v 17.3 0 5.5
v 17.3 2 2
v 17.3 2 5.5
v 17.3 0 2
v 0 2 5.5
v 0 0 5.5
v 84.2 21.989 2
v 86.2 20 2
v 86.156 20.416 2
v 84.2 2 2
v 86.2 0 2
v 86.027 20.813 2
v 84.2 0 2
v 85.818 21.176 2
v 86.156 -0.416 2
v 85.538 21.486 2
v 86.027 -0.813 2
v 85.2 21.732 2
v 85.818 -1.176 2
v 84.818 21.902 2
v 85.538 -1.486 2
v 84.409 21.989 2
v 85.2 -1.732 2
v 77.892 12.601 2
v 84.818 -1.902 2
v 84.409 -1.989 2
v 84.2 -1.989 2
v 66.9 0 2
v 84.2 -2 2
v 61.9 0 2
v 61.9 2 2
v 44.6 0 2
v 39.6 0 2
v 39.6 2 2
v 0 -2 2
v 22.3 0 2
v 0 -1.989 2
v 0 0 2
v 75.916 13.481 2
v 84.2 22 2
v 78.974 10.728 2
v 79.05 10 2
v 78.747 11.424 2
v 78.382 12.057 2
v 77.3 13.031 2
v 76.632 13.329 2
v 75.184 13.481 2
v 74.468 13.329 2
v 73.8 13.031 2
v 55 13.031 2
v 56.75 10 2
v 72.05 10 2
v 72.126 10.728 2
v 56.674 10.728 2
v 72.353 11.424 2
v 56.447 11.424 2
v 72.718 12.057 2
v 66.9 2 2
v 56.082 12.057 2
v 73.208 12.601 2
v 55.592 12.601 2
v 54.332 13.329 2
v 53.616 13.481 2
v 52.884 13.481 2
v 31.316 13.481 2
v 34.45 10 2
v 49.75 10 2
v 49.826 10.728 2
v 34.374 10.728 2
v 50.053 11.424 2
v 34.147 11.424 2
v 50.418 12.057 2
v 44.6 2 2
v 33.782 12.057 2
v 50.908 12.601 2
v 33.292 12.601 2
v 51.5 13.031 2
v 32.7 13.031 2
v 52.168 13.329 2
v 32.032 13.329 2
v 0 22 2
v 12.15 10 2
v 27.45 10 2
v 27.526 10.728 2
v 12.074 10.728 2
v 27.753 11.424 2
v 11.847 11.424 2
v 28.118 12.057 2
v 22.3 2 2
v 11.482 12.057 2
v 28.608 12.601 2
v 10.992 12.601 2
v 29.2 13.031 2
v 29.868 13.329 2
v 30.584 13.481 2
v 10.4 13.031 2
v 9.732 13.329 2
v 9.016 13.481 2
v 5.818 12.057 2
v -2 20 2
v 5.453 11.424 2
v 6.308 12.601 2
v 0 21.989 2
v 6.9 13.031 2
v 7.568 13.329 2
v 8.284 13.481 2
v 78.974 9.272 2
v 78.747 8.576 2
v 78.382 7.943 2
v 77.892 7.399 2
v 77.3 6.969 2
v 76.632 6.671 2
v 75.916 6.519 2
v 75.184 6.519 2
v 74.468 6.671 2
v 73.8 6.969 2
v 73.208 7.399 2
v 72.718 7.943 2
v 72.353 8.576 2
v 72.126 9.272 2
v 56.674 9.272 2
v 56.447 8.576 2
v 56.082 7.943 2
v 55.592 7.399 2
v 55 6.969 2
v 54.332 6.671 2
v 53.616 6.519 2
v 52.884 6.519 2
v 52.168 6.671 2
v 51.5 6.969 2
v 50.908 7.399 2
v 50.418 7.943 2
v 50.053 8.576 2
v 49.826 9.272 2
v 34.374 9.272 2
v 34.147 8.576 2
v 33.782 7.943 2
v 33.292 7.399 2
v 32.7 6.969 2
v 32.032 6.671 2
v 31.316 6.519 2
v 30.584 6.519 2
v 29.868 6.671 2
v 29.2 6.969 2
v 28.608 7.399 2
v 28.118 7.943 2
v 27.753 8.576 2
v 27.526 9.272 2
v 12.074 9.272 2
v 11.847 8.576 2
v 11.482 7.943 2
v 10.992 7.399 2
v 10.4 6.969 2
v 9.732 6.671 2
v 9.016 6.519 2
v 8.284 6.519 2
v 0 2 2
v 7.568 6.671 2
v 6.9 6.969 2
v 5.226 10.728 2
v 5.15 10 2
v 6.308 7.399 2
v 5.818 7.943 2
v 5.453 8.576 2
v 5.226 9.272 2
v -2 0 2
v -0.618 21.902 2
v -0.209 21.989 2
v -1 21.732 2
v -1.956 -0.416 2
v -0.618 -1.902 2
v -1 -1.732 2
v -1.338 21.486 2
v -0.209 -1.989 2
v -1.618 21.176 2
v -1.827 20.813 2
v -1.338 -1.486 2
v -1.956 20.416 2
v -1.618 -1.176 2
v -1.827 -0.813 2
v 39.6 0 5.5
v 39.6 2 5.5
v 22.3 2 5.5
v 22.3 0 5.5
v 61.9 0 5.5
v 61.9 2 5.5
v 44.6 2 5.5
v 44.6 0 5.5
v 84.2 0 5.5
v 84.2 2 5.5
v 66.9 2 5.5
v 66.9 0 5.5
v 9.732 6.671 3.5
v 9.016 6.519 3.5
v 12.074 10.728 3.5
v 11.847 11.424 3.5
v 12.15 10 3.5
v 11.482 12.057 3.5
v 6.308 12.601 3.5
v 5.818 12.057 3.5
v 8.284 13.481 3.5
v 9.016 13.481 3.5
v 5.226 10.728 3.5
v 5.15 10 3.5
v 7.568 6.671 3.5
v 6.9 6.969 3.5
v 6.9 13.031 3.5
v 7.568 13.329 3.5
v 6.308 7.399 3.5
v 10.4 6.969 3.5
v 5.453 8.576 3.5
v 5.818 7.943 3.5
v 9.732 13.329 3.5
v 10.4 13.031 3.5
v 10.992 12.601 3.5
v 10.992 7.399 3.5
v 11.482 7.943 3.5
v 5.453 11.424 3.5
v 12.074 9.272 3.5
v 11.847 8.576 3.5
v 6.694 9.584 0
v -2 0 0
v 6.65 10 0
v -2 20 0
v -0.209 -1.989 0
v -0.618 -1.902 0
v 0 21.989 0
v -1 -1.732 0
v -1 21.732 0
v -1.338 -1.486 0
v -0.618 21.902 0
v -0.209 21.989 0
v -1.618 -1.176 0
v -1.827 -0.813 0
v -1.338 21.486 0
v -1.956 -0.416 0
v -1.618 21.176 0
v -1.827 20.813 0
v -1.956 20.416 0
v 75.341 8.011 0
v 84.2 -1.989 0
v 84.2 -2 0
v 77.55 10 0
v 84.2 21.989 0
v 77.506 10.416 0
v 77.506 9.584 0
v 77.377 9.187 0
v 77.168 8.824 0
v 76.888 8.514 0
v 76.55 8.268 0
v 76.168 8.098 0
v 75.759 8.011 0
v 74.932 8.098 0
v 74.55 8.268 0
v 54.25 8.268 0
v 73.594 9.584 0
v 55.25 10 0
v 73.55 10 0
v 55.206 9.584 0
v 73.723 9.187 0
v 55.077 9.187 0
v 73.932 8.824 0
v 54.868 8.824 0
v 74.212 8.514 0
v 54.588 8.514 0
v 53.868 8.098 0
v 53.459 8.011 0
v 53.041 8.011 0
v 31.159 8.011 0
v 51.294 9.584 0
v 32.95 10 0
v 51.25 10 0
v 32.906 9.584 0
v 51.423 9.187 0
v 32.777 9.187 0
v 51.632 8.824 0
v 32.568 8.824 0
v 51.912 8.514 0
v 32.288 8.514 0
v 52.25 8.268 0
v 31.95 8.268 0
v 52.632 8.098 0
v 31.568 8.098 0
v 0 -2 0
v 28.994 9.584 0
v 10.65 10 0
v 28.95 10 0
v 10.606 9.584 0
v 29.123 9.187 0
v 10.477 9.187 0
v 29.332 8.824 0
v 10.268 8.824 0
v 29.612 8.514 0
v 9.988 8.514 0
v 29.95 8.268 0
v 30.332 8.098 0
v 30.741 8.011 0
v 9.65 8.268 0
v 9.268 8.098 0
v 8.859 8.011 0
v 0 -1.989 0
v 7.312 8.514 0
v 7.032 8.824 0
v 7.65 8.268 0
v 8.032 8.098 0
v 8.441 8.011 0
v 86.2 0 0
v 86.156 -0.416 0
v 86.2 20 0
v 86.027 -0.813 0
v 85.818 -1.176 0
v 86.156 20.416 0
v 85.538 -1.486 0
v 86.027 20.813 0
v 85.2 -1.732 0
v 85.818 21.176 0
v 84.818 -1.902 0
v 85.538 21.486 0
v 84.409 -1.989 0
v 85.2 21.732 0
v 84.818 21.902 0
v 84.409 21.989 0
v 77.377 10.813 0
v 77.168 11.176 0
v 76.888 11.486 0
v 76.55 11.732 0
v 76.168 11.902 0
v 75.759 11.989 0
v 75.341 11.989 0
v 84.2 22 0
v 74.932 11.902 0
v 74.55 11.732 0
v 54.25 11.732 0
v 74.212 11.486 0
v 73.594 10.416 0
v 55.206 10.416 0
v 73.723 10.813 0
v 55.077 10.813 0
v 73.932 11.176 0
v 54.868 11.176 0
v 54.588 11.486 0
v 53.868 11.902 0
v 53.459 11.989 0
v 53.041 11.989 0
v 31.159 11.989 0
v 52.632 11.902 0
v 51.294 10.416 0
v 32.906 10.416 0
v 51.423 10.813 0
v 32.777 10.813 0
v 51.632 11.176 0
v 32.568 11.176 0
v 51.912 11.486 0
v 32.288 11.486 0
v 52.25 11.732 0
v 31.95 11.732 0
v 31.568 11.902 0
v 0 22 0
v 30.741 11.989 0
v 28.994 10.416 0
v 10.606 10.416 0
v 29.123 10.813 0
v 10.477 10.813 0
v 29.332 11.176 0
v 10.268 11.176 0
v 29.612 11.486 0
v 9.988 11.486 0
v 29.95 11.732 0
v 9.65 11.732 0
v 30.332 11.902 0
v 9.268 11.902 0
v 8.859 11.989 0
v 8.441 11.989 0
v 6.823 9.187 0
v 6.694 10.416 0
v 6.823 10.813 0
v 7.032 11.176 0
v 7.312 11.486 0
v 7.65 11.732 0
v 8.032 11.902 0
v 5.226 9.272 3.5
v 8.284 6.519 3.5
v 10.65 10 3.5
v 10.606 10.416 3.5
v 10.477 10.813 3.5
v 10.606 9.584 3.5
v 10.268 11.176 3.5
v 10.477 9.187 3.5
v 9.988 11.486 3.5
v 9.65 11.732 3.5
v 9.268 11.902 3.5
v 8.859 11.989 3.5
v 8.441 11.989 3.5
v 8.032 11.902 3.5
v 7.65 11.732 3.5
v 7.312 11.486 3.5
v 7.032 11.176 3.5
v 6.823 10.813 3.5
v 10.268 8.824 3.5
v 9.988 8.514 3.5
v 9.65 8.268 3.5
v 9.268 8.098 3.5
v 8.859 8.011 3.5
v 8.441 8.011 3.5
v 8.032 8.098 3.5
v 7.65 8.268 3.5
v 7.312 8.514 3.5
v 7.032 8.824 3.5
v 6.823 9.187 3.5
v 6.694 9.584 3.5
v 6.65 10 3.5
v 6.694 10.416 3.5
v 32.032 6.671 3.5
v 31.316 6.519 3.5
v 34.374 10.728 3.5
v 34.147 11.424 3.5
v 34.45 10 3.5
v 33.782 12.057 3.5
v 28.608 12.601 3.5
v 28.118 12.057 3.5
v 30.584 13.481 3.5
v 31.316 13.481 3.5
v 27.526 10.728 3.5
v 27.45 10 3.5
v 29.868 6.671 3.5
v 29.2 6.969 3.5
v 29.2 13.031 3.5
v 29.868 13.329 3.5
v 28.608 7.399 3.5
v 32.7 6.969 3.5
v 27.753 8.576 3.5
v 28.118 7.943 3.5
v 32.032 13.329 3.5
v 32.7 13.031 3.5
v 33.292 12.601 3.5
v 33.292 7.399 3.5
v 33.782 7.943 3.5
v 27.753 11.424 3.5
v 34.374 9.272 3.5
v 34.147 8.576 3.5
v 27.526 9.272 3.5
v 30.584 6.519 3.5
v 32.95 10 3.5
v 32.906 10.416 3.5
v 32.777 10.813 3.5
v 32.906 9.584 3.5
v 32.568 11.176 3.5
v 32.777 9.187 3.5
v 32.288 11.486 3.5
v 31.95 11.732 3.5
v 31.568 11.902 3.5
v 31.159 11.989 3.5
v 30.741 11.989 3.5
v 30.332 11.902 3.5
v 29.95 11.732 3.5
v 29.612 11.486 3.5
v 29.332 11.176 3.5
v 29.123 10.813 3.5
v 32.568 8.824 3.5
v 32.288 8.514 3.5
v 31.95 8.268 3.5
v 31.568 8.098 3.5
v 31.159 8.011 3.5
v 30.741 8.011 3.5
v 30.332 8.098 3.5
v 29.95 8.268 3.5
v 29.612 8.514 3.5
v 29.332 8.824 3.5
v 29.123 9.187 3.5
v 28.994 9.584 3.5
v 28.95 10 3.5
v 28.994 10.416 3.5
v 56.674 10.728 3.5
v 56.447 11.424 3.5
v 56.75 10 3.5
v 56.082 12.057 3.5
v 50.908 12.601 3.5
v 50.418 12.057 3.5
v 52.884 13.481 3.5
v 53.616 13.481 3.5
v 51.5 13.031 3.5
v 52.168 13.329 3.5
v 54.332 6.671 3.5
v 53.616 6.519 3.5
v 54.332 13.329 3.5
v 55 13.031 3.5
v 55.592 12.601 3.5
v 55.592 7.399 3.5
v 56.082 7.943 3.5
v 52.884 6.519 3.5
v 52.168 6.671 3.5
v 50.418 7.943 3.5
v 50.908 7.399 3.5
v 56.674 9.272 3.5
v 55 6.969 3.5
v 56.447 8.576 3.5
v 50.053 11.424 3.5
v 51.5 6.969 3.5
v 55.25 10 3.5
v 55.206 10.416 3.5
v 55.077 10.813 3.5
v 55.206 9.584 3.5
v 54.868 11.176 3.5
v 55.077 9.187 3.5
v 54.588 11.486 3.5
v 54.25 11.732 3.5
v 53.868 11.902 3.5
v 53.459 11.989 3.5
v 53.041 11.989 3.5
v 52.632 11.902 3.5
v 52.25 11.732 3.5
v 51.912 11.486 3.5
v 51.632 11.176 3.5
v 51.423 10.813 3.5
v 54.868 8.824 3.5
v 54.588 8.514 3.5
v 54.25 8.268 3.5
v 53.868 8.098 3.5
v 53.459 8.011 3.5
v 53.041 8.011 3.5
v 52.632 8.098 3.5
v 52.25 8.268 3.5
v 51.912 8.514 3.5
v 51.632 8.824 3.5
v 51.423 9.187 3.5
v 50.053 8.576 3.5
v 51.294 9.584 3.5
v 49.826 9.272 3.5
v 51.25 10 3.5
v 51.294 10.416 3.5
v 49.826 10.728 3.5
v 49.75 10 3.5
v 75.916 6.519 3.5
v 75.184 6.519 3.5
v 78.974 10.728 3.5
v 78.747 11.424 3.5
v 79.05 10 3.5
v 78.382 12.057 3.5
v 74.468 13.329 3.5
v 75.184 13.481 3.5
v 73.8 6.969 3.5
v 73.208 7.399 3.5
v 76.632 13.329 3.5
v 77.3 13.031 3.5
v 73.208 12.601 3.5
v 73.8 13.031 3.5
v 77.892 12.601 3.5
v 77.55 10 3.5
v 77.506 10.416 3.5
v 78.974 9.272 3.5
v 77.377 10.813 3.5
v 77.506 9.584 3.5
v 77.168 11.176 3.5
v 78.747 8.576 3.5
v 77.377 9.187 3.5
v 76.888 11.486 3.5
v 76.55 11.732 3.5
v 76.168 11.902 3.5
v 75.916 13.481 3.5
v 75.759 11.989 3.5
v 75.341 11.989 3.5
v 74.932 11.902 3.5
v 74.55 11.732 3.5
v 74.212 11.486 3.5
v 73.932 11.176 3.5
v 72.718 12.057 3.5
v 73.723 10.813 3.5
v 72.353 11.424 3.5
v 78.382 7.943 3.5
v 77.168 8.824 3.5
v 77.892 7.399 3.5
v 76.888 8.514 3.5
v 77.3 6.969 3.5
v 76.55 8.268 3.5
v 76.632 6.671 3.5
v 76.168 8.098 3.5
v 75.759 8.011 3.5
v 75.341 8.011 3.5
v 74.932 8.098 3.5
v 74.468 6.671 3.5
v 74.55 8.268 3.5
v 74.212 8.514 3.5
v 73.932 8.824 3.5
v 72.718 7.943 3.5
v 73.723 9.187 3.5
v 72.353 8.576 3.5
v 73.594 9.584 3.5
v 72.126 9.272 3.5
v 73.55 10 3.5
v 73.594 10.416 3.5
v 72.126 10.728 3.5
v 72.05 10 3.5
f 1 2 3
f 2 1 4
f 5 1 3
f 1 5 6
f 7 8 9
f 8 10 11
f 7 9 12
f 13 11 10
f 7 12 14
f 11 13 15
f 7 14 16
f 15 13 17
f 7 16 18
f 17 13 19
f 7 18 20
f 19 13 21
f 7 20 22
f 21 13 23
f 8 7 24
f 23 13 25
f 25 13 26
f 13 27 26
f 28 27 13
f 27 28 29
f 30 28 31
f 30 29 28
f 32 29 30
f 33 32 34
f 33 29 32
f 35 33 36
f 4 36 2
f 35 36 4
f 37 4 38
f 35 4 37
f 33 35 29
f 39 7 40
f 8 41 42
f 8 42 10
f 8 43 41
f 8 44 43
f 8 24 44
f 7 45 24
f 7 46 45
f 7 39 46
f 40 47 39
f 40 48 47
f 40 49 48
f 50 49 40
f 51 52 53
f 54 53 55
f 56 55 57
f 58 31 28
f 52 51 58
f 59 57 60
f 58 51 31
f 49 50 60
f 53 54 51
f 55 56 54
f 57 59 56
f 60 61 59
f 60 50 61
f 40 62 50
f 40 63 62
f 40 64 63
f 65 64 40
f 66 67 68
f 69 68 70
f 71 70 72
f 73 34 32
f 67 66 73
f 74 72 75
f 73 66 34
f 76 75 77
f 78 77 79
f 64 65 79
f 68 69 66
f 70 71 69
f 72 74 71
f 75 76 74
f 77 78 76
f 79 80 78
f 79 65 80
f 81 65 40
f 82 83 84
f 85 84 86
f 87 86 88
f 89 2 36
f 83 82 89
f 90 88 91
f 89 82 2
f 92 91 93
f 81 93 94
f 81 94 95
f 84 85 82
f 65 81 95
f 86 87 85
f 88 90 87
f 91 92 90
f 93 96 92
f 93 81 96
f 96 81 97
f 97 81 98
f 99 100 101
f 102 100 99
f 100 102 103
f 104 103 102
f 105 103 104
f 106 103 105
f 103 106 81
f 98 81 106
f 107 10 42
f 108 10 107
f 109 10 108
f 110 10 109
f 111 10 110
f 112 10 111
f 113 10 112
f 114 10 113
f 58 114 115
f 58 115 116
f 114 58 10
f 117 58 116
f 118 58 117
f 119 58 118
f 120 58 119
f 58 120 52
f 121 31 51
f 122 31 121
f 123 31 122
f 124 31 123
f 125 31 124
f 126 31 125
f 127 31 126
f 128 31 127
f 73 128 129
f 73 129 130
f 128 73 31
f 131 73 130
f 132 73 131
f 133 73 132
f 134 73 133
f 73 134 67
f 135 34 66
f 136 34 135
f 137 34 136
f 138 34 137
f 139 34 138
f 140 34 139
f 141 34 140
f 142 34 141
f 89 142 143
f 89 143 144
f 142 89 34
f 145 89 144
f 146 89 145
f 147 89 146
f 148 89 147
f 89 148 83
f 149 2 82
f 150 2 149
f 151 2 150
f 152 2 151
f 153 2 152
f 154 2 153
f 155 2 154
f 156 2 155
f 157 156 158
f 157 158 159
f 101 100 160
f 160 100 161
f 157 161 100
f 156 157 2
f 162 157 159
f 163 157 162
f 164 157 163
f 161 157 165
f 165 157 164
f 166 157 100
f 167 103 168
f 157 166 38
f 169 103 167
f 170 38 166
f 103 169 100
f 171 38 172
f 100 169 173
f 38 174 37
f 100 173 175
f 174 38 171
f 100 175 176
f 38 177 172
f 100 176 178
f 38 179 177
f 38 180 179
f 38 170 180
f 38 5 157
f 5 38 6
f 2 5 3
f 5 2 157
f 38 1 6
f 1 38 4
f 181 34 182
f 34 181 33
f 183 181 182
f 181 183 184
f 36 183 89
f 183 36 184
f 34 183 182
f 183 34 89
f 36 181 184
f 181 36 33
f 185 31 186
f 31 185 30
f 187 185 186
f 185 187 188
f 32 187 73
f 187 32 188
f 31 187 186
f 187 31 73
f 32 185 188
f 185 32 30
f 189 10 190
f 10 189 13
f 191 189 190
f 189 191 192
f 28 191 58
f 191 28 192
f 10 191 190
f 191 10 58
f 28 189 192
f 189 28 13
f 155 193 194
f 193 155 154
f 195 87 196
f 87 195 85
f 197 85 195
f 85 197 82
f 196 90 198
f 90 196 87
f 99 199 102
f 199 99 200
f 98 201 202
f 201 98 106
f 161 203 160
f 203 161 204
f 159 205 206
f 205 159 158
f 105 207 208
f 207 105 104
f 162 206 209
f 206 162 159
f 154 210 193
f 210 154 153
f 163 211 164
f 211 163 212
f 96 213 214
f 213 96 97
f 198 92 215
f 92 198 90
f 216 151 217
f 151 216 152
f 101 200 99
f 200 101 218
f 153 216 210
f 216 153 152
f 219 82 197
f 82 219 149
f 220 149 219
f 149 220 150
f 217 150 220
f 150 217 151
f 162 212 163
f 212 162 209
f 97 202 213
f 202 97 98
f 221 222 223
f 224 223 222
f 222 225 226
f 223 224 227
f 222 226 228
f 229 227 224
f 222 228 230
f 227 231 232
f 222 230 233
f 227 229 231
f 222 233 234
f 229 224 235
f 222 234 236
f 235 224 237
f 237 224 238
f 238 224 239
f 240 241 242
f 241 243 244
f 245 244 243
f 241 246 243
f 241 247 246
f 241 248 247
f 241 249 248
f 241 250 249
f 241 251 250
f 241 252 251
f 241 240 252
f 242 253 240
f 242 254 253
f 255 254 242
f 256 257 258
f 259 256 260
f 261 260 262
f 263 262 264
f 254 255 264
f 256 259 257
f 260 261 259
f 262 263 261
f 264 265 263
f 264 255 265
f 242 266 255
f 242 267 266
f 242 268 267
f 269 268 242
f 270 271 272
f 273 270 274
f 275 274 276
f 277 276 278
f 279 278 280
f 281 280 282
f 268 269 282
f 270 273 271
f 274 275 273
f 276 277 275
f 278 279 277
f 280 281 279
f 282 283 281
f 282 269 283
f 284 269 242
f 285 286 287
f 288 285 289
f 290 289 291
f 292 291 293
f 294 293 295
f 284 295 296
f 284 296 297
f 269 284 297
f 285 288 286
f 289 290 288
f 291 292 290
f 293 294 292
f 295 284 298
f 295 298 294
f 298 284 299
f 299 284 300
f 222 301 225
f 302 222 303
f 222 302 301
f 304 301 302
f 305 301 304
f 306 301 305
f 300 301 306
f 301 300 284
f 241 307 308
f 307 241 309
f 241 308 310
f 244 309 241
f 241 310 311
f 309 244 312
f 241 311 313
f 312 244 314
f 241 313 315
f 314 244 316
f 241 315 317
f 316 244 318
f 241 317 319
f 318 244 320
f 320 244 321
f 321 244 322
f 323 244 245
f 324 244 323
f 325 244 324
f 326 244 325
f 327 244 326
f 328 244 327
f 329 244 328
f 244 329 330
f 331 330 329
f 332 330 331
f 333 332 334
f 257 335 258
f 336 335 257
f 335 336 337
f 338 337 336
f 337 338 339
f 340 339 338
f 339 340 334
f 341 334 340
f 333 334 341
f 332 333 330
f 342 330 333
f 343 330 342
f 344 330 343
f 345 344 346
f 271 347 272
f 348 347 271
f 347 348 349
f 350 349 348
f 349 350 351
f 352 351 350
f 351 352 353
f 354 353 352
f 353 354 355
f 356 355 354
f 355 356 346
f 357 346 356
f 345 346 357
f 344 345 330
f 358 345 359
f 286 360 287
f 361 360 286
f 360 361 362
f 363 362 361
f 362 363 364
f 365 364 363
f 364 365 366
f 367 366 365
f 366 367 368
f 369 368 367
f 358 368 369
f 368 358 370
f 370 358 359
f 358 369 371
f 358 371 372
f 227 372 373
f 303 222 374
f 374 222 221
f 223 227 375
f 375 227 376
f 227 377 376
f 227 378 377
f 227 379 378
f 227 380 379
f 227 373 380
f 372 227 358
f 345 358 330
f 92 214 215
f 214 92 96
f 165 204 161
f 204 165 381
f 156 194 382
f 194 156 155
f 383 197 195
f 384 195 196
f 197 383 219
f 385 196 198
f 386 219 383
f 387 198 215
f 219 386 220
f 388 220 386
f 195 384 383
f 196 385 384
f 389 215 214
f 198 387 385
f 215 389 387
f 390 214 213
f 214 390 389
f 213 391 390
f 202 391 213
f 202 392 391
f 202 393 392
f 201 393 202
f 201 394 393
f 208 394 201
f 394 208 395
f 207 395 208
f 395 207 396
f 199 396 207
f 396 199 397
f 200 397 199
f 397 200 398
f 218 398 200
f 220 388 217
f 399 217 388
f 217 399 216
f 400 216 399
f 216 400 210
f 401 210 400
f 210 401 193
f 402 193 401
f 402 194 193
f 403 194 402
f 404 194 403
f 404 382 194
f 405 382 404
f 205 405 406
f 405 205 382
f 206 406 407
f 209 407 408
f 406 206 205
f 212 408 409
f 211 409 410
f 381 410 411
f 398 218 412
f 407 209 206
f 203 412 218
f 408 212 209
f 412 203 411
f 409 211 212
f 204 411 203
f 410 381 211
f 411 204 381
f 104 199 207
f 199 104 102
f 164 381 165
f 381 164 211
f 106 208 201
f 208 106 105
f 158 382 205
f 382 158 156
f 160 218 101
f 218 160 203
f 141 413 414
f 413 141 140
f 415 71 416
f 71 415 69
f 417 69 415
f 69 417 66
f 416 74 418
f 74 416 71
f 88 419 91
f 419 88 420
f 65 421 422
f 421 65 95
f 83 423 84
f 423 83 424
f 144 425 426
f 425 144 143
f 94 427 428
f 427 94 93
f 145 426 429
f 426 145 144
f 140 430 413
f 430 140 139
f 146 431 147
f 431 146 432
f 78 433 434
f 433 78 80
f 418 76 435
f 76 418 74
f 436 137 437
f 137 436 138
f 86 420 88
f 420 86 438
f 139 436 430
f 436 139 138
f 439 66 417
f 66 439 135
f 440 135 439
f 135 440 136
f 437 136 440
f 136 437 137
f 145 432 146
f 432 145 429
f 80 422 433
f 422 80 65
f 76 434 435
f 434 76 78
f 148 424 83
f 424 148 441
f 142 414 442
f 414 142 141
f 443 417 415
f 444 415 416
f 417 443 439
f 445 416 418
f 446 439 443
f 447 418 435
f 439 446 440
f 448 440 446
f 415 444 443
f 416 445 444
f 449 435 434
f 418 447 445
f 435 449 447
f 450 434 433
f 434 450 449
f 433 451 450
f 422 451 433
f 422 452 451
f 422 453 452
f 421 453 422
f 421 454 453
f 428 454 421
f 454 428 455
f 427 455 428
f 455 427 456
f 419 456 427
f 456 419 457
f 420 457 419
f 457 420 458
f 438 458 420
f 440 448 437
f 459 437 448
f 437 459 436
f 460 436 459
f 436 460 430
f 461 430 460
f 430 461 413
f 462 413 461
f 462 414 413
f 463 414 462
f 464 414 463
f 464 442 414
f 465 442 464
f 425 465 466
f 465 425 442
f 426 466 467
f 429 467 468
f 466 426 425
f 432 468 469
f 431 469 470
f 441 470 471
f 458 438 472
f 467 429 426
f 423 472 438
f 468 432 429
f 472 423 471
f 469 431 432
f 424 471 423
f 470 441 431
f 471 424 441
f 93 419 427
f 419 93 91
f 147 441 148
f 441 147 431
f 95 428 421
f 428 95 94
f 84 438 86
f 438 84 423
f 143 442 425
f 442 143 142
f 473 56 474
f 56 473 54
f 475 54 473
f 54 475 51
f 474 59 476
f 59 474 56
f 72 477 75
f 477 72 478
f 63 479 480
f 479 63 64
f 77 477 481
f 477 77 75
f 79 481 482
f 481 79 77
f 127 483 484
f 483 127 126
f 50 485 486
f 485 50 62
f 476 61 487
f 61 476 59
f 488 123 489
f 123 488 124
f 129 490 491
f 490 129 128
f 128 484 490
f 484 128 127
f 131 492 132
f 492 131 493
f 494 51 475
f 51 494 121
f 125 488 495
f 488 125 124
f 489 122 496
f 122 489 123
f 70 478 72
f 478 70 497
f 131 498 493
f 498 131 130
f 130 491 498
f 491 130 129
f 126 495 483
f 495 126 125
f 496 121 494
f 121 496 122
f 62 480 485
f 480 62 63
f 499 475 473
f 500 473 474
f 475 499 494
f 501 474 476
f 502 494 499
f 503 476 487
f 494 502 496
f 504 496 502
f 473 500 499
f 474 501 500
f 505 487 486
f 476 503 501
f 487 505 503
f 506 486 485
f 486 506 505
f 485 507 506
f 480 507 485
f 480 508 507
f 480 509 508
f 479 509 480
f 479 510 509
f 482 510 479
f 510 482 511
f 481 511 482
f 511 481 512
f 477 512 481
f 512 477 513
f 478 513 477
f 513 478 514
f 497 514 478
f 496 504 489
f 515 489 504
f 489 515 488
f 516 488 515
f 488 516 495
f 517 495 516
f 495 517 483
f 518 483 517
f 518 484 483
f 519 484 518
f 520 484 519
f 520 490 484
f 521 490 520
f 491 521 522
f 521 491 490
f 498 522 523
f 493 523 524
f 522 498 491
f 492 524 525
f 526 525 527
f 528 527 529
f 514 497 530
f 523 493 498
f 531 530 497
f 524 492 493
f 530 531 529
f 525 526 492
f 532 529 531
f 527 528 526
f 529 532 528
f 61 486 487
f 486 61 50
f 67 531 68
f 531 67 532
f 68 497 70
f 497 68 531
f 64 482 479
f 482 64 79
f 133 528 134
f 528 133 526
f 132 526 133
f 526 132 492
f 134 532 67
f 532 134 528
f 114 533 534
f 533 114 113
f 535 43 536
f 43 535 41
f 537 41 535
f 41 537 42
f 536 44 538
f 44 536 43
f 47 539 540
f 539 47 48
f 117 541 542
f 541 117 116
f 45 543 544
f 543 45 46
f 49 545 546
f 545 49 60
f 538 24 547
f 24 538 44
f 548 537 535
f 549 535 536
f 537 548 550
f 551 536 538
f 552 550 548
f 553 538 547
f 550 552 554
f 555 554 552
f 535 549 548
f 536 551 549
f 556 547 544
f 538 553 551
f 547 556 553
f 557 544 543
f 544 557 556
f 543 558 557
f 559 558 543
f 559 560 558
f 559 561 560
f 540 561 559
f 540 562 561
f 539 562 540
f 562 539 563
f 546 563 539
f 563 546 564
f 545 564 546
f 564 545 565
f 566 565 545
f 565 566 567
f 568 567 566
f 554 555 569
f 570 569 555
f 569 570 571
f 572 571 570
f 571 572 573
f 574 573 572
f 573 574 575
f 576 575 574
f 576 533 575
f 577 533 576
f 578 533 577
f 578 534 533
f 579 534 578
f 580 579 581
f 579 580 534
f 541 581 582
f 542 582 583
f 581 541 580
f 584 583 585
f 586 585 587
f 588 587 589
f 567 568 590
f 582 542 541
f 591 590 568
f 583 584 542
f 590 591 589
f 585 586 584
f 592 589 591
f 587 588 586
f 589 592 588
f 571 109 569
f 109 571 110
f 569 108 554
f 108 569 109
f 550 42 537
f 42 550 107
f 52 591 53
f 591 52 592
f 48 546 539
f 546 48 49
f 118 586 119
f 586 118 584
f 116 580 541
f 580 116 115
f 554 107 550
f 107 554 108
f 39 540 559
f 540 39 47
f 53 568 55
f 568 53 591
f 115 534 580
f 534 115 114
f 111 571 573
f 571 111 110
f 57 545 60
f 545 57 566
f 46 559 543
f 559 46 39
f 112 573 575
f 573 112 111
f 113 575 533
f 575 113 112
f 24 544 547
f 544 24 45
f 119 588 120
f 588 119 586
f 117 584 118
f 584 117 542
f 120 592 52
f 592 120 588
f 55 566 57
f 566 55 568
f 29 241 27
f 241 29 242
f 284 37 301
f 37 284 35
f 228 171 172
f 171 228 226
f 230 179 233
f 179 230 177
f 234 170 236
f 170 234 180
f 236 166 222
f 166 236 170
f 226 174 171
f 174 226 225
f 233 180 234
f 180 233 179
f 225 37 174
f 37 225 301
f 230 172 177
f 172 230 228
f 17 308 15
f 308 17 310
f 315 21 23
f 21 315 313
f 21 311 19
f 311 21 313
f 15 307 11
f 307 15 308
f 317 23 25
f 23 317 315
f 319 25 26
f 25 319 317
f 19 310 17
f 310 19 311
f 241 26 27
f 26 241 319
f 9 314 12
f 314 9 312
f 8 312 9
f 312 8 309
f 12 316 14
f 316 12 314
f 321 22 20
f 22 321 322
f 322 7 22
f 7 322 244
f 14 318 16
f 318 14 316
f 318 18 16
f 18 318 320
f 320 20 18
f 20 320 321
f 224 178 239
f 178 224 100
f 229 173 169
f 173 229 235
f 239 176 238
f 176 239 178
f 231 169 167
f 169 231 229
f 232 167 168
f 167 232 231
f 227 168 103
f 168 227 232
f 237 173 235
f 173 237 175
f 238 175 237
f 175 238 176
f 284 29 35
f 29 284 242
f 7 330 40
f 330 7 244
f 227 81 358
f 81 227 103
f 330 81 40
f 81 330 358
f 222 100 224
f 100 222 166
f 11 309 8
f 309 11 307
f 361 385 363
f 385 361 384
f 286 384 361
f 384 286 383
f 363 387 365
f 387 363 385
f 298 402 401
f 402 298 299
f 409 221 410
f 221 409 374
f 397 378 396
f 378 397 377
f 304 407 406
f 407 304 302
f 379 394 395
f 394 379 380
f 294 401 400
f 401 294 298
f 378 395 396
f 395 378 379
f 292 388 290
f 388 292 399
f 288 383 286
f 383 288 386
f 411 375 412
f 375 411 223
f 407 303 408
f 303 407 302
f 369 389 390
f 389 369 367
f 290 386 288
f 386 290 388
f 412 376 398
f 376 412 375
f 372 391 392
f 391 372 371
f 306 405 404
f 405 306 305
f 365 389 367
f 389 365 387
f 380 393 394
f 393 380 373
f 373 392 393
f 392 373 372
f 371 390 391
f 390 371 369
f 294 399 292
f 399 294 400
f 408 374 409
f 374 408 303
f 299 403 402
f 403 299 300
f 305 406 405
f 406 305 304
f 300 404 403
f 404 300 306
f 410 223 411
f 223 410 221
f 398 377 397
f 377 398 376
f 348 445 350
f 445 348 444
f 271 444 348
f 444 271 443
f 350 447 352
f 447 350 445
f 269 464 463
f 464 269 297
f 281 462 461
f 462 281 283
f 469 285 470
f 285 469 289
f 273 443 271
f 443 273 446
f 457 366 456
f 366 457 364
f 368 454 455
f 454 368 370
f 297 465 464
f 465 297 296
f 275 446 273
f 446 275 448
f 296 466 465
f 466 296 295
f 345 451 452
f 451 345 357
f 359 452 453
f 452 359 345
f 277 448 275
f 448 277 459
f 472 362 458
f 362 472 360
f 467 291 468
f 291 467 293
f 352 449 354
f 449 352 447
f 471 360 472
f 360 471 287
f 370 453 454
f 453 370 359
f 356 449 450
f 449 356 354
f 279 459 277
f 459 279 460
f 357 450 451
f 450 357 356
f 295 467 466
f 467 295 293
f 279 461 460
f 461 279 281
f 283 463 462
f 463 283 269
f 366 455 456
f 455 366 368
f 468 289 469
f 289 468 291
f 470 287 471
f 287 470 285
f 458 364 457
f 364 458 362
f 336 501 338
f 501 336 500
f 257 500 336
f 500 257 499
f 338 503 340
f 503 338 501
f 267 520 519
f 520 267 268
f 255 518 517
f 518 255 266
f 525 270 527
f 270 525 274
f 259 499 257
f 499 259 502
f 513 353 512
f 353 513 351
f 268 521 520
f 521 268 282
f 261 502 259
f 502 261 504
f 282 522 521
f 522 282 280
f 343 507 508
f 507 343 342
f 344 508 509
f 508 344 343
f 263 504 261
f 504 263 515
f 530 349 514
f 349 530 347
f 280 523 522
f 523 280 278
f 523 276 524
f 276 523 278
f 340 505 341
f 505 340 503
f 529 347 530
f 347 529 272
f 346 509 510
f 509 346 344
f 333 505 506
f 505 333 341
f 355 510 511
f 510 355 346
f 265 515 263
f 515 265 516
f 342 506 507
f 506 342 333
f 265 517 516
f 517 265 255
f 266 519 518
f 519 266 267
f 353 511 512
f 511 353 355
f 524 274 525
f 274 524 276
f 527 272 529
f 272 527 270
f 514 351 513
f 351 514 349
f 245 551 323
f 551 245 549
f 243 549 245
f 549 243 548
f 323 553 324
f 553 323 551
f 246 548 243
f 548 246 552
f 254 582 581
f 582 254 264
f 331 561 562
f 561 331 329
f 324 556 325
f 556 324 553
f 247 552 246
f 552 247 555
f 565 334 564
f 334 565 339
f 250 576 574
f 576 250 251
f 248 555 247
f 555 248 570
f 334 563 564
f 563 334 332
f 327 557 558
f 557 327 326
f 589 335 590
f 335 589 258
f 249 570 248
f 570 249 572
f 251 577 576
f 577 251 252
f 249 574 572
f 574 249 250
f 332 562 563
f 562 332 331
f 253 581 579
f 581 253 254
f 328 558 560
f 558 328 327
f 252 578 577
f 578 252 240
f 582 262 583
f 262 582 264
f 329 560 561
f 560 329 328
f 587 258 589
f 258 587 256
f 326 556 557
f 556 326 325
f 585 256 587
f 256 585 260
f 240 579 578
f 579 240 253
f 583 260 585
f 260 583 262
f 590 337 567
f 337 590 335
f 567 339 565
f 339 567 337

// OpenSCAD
// Zrakotron MQ odjeljak

//univ. const.
uspace=2;
uheight=2;

//mq holder section
//general shape
mq_eff_w=20;
mq_space=17.3;
mq_divide=5;
//holder bar dimensions
mq_holder_space=6.4;
mq_holder_h=3.5;
mq_holder_d=2;
//holes
mq_offset=1.5;
mq_hole_radius=2;
mq_offset_radius=mq_hole_radius+1.5;
//meta
section_l=4*mq_space+3*mq_divide;
section_w=mq_eff_w;
sensorspace=mq_space+mq_divide;

mq_section();

module mq_section(){
    difference(){
        union(){
            // main plate
            cube([section_l,section_w,uheight],false);
            // holders
            for(i=[0,1,2,3]){
                translate([i*sensorspace,0,uheight])cube([mq_space,mq_holder_d,mq_holder_h],false);
            }
            // screw offsets
            for(i=[0,1,2,3]){
                translate([mq_space/2+i*sensorspace,section_w/2,0])cylinder(uheight+mq_offset,mq_offset_radius,mq_offset_radius,false,$fn=30);
            }
            // edge
            translate([0,0,uheight/2])cylinder(uheight,uspace,uspace,true,$fn=30);
            translate([section_l,0,uheight/2])cylinder(uheight,uspace,uspace,true,$fn=30);
            translate([section_l,section_w,uheight/2])cylinder(uheight,uspace,uspace,true,$fn=30);
            translate([0,section_w,uheight/2])cylinder(uheight,uspace,uspace,true,$fn=30);
            translate([0,-uspace,0])cube([section_l,uspace,uheight],false);
            translate([0,section_w,0])cube([section_l,uspace,uheight],false);
            translate([-uspace,0,0])cube([uspace,section_w,uheight],false);
            translate([section_l,0,0])cube([uspace,section_w,uheight],false);
        }
        // mounting holes
        for(i=[0,1,2,3]){
            translate([mq_space/2+i*sensorspace,section_w/2,uheight/2])cylinder(10*uheight,mq_hole_radius,mq_hole_radius,true,$fn=30);
        }
    }
}
